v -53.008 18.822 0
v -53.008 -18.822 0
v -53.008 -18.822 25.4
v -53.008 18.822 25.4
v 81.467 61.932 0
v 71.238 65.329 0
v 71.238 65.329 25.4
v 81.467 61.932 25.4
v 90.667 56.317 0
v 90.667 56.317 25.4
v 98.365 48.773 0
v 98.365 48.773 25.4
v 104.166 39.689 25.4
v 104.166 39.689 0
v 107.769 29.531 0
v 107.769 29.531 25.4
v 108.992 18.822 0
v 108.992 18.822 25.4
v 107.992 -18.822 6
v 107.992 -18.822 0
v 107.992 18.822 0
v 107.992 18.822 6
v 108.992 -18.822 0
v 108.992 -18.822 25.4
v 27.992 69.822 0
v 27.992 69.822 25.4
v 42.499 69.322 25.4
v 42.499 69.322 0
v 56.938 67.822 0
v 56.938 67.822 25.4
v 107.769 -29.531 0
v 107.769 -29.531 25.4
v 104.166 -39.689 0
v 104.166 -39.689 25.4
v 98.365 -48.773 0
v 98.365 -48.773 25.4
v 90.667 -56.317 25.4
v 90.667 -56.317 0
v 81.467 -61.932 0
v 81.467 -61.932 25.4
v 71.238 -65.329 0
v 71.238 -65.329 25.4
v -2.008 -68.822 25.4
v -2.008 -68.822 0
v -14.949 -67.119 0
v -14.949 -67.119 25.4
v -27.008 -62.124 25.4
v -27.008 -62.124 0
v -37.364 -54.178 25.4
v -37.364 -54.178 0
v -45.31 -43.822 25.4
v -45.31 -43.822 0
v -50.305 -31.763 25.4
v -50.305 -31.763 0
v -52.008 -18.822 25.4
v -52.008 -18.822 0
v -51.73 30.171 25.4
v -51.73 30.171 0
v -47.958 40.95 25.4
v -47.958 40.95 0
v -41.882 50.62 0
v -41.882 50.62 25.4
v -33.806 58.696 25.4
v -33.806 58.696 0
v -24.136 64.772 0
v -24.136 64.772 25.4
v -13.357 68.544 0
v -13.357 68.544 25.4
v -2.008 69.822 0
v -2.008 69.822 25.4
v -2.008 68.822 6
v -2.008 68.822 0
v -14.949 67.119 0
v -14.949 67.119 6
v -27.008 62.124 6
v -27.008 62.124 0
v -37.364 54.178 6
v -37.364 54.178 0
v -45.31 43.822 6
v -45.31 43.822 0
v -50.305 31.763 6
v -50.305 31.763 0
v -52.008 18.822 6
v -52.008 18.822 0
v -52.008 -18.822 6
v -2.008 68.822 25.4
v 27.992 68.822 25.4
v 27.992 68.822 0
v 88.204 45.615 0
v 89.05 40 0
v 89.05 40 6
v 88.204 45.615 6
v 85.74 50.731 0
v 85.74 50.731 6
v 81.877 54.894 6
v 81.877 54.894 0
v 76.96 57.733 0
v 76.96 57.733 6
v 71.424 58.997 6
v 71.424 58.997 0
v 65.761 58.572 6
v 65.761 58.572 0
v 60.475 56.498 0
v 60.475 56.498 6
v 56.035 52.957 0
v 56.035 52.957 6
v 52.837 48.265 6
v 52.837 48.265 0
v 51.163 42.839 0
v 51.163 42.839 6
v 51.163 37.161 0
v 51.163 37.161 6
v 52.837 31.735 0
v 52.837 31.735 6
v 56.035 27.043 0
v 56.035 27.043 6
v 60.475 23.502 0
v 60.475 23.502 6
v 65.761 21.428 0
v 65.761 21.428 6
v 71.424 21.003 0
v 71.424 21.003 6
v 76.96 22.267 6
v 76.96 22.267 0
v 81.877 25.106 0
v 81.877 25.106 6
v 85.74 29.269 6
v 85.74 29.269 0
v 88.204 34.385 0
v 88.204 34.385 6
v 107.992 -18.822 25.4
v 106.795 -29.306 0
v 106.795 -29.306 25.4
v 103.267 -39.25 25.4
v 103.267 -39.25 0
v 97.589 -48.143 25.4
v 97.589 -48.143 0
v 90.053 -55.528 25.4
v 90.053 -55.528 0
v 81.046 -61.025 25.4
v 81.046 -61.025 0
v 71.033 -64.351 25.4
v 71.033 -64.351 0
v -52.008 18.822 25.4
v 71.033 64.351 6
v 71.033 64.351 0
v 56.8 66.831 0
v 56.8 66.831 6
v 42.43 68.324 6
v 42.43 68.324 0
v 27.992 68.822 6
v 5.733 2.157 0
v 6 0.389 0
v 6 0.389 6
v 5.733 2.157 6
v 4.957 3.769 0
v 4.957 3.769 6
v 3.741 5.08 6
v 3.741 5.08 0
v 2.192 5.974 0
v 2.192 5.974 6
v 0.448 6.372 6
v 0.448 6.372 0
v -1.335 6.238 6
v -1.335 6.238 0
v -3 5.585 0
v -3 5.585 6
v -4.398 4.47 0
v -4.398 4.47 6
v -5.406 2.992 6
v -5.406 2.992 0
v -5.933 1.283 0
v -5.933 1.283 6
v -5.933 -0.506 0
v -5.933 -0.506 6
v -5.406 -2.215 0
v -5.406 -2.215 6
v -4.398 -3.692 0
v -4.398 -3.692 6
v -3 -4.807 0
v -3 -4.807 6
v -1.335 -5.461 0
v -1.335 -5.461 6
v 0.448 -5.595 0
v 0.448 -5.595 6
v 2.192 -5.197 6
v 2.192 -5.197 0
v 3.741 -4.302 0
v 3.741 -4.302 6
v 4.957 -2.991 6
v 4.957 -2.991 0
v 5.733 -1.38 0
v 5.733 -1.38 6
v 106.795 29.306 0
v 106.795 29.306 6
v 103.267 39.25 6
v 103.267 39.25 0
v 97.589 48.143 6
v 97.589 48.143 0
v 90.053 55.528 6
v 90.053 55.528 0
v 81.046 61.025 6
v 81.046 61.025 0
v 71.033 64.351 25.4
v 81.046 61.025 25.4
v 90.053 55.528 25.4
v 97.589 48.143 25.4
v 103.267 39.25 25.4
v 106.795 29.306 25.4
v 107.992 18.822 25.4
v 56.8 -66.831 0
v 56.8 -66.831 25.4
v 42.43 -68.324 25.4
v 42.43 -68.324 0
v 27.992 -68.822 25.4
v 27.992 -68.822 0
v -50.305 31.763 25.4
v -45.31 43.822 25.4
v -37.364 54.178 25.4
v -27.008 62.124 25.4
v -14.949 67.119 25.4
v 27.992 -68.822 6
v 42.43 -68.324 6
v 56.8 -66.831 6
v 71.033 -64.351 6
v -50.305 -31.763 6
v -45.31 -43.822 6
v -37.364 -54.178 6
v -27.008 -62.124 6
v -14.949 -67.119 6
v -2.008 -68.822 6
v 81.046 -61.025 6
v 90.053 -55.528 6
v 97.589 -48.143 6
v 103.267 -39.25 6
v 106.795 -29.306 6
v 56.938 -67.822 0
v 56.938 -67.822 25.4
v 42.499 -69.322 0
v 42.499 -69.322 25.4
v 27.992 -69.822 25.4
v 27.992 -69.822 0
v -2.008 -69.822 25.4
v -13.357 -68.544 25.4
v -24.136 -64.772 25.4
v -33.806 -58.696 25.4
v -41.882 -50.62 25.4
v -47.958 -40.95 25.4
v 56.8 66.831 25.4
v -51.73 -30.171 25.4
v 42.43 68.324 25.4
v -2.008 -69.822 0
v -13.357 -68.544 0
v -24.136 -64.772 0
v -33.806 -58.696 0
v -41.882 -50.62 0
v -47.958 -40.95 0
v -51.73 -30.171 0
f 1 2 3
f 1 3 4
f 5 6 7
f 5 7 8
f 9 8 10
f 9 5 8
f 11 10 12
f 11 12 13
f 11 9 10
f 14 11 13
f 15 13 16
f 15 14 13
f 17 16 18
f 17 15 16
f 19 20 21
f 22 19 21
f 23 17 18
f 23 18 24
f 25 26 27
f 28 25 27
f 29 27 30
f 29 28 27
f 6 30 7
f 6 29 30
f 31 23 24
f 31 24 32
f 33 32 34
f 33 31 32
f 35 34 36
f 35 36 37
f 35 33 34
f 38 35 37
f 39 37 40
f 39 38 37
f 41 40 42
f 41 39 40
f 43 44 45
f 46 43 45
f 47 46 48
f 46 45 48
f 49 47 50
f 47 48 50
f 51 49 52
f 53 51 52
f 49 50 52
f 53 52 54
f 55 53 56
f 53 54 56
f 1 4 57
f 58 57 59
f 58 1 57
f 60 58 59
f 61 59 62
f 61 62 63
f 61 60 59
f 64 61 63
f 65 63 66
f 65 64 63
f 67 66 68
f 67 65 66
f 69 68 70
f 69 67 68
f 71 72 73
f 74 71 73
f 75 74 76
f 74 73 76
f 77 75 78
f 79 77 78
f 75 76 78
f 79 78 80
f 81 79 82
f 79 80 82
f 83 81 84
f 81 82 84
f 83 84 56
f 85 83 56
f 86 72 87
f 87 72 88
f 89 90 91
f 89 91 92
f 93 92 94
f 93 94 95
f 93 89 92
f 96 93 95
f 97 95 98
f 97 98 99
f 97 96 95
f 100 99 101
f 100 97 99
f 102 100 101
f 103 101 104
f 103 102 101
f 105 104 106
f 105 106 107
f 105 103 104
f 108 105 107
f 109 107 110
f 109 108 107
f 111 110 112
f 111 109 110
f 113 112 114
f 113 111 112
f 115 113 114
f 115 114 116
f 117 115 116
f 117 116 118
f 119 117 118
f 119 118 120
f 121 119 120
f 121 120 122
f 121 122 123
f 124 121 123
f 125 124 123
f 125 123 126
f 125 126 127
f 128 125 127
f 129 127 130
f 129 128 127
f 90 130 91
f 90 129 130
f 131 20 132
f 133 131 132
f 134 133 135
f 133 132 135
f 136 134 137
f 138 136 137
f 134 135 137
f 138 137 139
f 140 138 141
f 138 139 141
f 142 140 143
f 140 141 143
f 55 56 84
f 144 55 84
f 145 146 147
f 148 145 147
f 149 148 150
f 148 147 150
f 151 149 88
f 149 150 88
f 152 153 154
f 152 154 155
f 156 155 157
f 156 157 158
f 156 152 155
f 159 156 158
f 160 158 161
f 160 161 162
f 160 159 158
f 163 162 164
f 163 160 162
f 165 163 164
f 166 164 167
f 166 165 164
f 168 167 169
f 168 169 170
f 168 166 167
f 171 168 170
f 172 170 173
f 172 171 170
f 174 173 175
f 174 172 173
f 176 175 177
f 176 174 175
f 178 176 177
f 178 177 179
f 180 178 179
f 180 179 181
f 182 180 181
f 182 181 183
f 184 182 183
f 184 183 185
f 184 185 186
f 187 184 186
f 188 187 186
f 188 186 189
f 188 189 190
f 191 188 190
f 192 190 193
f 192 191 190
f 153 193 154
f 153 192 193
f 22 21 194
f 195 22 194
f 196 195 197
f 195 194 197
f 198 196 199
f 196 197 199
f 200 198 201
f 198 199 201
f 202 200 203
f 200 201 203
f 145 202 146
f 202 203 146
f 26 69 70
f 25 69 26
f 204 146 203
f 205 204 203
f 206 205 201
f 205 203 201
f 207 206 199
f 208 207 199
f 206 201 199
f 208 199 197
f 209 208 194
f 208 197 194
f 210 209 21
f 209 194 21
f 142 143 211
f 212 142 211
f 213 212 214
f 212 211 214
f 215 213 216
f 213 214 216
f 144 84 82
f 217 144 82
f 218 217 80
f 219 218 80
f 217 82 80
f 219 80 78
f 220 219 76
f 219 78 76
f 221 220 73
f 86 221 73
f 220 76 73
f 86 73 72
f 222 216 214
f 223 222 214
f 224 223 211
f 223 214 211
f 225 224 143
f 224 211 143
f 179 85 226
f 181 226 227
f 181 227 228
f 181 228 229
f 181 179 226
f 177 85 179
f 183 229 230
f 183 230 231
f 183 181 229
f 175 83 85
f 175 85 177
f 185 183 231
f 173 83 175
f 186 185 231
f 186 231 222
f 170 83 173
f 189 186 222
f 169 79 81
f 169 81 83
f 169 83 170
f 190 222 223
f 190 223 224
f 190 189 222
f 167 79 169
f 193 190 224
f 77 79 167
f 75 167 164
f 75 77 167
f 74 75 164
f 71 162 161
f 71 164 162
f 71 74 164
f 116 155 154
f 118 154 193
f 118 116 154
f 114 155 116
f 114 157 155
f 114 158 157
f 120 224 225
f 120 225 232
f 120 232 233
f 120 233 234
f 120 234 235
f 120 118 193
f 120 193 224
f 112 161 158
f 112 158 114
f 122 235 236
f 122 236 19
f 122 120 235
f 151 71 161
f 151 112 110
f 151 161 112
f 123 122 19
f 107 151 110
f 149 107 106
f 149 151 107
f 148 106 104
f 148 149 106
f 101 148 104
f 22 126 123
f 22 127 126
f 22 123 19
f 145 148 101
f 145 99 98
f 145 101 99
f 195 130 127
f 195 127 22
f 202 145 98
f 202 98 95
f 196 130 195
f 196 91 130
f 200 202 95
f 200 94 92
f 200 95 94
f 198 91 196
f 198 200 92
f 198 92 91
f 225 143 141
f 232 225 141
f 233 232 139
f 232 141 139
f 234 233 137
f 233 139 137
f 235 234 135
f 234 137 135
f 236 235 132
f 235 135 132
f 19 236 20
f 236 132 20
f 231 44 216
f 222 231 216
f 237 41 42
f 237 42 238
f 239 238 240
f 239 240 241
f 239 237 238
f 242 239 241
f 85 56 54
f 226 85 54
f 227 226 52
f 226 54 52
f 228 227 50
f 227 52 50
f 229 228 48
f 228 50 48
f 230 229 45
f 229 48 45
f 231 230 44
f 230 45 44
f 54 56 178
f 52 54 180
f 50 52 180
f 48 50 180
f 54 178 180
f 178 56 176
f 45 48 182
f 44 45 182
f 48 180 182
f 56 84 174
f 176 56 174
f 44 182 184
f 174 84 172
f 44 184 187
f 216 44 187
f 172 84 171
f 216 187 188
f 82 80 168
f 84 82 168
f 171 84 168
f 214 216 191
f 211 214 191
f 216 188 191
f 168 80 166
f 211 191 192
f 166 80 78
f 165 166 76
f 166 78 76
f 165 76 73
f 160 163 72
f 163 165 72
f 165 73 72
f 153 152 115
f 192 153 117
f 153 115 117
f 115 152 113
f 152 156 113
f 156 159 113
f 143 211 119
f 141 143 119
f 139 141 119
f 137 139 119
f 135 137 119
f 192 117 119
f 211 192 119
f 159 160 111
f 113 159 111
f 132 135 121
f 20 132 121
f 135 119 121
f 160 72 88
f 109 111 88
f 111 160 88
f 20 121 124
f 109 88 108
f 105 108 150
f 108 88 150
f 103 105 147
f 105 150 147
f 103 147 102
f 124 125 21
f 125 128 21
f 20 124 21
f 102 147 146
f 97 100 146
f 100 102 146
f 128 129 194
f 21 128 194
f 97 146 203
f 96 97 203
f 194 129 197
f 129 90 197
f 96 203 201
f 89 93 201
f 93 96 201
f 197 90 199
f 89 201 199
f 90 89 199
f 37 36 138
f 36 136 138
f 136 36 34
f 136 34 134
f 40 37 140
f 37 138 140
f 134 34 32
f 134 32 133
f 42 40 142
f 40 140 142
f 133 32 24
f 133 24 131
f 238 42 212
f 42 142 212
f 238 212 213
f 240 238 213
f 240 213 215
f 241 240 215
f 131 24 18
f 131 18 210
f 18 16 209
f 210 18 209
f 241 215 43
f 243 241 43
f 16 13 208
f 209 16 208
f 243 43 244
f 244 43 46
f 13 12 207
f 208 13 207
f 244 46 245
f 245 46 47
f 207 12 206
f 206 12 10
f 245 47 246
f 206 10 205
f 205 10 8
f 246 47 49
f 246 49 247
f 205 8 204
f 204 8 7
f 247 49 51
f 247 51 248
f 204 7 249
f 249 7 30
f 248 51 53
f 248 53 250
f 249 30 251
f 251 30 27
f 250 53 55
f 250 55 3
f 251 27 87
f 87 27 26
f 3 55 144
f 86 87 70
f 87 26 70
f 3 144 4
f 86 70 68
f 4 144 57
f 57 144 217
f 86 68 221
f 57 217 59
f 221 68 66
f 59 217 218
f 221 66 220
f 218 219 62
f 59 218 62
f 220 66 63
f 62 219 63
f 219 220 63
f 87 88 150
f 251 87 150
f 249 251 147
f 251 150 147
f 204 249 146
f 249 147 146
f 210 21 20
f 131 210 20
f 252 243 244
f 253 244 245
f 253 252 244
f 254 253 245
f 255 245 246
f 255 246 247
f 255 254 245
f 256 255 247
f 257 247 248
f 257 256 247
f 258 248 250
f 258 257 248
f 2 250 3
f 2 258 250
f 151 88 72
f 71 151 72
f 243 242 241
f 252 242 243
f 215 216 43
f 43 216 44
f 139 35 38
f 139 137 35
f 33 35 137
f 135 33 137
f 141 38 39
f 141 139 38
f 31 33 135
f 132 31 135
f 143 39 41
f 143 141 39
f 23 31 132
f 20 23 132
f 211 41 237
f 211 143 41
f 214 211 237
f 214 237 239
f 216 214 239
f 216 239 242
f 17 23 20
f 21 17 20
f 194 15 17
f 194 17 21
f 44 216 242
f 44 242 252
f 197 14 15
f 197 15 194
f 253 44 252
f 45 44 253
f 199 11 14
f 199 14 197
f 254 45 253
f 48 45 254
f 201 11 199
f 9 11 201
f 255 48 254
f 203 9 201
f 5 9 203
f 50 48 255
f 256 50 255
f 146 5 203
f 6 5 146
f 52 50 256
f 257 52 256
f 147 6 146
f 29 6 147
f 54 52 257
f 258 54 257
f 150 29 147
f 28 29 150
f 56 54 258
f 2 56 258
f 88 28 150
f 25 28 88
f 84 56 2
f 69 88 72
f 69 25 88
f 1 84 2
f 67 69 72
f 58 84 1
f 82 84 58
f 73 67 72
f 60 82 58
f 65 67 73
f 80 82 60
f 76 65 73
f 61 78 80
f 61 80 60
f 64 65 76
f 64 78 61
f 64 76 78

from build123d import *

# Parameters (mm, degrees)
SKETCH1_R           = 19.05
SKETCH1_R_2         = 6
BOSS_EXTRUDE1_DEPTH = 6
BOSS_EXTRUDE2_DEPTH = 25.4


with BuildPart() as part:
    # Sketch1 → Boss-Extrude1 (new body)
    with BuildSketch(Plane.XY):
        with BuildLine():
            Line((27.991748635, 68.822308036), (-2.008251365, 68.822308036))
            ThreePointArc((-2.008251365, 68.822308036), (-37.363590424, 54.177647096), (-52.008251365, 18.822308036))
            Line((-52.008251365, 18.822308036), (-52.008251365, -18.822308036))
            ThreePointArc((-52.008251365, -18.822308036), (-37.363590424, -54.177647096), (-2.008251365, -68.822308036))
            Line((-2.008251365, -68.822308036), (27.991748635, -68.822308036))
            ThreePointArc((27.991748635, -68.822308036), (49.628085606, -67.701435879), (71.032776775, -64.350819837))
            ThreePointArc((71.032776775, -64.350819837), (97.588910481, -48.142996073), (107.991748635, -18.822308036))
            Line((107.991748635, -18.822308036), (107.991748635, 18.822308036))
            ThreePointArc((107.991748635, 18.822308036), (97.588910481, 48.142996073), (71.032776775, 64.350819837))
            ThreePointArc((71.032776775, 64.350819837), (49.628085606, 67.701435879), (27.991748635, 68.822308036))
        make_face()
        with Locations((70, 40)):
            Circle(SKETCH1_R, mode=Mode.SUBTRACT)
        with Locations((0, 0.38867669)):
            Circle(SKETCH1_R_2, mode=Mode.SUBTRACT)
    extrude(amount=BOSS_EXTRUDE1_DEPTH)


with BuildPart() as body_2:
    # Sketch2 → Boss-Extrude2 (new body)
    with BuildSketch(Plane(origin=(0, 0, 0), x_dir=(-1, 0, 0), z_dir=(0, 0, -1))):
        with BuildLine():
            Line((2.008251365, 69.822308036), (-27.991748635, 69.822308036))
            ThreePointArc((-27.991748635, 69.822308036), (-49.731418444, 68.696082713), (-71.238336135, 65.329464487))
            ThreePointArc((-71.238336135, 65.329464487), (-98.365299353, 48.773250244), (-108.991748635, 18.822308036))
            Line((-108.991748635, 18.822308036), (-108.991748635, -18.822308036))
            ThreePointArc((-108.991748635, -18.822308036), (-98.365299353, -48.773250244), (-71.238336135, -65.329464487))
            ThreePointArc((-71.238336135, -65.329464487), (-49.731418444, -68.696082713), (-27.991748635, -69.822308036))
            Line((-27.991748635, -69.822308036), (2.008251365, -69.822308036))
            ThreePointArc((2.008251365, -69.822308036), (38.070697206, -54.884753877), (53.008251365, -18.822308036))
            Line((53.008251365, -18.822308036), (53.008251365, 18.822308036))
            ThreePointArc((53.008251365, 18.822308036), (38.070697206, 54.884753877), (2.008251365, 69.822308036))
        make_face()
        with BuildLine():
            Line((2.008251365, 68.822308036), (-27.991748635, 68.822308036))
            ThreePointArc((-27.991748635, 68.822308036), (-49.628085606, 67.701435879), (-71.032776775, 64.350819837))
            ThreePointArc((-71.032776775, 64.350819837), (-97.588910481, 48.142996073), (-107.991748635, 18.822308036))
            Line((-107.991748635, 18.822308036), (-107.991748635, -18.822308036))
            ThreePointArc((-107.991748635, -18.822308036), (-97.588910481, -48.142996073), (-71.032776775, -64.350819837))
            ThreePointArc((-71.032776775, -64.350819837), (-49.628085606, -67.701435879), (-27.991748635, -68.822308036))
            Line((-27.991748635, -68.822308036), (2.008251365, -68.822308036))
            ThreePointArc((2.008251365, -68.822308036), (37.363590424, -54.177647096), (52.008251365, -18.822308036))
            Line((52.008251365, -18.822308036), (52.008251365, 18.822308036))
            ThreePointArc((52.008251365, 18.822308036), (37.363590424, 54.177647096), (2.008251365, 68.822308036))
        make_face(mode=Mode.SUBTRACT)
    extrude(amount=-BOSS_EXTRUDE2_DEPTH)


solid = Compound([part.part, body_2.part])
